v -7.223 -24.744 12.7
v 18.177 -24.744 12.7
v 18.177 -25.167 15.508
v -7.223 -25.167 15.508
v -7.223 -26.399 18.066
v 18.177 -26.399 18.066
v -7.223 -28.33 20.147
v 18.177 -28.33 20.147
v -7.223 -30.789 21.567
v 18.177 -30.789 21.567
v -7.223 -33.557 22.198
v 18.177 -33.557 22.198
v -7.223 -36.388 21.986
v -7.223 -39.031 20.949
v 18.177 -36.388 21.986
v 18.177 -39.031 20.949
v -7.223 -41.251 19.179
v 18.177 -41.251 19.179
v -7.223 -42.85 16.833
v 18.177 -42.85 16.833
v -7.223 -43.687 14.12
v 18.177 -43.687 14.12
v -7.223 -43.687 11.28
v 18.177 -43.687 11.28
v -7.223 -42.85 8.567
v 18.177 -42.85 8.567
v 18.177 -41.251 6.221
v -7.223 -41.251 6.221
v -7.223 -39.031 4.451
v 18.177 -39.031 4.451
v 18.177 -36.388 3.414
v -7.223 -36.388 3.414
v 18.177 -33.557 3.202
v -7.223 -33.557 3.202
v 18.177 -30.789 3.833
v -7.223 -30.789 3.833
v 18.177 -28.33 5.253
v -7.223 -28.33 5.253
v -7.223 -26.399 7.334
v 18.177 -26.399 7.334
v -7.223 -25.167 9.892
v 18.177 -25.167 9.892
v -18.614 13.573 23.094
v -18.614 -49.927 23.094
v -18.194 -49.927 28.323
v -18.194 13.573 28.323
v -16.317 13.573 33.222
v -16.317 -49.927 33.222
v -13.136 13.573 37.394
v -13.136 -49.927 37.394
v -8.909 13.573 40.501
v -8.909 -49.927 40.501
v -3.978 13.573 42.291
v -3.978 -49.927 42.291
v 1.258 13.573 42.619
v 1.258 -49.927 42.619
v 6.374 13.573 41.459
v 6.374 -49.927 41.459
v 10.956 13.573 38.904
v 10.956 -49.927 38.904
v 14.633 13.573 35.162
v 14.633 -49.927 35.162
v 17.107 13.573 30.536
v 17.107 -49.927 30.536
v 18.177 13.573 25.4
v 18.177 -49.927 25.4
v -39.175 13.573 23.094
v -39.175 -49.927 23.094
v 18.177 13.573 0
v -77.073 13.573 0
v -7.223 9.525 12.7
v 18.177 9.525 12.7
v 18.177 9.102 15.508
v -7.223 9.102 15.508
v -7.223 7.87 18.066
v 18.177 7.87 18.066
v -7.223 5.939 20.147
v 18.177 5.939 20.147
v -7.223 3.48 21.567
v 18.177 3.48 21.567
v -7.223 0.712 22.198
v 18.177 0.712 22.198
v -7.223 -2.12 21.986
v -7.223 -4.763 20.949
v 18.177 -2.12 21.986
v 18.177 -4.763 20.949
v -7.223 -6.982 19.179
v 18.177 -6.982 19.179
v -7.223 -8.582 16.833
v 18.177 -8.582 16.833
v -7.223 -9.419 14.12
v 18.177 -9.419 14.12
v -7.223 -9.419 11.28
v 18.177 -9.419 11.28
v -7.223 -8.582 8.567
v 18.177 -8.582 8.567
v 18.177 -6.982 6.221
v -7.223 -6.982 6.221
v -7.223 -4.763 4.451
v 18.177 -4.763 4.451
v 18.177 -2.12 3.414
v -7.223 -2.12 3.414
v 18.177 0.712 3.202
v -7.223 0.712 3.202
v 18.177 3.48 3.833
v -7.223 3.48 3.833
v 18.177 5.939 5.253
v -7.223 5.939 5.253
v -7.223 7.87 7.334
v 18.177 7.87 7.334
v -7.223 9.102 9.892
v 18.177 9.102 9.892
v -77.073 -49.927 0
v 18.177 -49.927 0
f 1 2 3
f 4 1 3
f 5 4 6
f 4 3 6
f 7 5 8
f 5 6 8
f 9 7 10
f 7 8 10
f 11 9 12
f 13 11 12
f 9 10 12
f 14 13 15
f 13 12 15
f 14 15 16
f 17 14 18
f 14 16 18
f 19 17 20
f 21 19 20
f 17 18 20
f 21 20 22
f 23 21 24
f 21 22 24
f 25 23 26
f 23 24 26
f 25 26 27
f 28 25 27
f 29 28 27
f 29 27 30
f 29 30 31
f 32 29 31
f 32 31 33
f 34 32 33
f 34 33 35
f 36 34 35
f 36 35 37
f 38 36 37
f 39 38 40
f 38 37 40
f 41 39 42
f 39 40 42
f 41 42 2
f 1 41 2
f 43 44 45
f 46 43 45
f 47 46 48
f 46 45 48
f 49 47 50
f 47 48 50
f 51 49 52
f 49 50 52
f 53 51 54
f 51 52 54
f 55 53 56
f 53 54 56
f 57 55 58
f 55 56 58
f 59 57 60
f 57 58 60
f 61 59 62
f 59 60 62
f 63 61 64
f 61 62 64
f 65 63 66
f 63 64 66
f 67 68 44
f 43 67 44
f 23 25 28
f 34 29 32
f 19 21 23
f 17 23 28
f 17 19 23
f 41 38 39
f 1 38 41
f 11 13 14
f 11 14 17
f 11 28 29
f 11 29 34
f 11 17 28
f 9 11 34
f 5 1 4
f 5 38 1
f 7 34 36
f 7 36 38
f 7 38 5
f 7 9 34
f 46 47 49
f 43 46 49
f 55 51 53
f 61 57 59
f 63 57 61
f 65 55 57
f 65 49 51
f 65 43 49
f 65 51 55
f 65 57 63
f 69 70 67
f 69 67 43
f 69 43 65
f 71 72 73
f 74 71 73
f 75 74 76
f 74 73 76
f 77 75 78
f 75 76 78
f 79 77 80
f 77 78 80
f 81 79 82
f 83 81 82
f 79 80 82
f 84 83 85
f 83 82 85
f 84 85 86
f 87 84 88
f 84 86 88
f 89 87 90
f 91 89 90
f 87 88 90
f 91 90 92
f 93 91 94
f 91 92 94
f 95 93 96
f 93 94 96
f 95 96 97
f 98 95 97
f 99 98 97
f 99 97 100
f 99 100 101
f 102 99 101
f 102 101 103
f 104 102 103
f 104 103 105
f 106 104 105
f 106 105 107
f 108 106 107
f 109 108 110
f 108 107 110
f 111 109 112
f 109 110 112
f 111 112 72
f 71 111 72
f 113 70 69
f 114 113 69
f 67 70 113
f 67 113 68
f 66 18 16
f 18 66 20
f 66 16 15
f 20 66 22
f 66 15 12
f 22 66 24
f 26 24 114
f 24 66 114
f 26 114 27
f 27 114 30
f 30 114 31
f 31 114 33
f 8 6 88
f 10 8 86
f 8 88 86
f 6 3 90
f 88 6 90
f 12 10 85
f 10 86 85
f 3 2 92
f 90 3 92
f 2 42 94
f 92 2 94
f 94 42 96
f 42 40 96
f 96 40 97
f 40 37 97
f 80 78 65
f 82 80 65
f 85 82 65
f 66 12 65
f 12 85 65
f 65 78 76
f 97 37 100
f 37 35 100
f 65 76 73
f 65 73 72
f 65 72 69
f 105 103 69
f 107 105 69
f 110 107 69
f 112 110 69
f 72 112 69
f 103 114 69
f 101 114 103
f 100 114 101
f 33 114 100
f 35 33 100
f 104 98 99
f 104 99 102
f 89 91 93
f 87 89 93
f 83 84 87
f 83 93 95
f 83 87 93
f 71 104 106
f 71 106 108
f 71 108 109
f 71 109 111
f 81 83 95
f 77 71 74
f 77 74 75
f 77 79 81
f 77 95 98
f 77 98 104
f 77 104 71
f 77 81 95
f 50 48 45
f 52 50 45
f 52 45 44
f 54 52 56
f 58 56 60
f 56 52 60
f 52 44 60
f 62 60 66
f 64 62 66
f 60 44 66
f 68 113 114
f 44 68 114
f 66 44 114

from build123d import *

# Parameters (mm, degrees)
F0_W     = 95.25
F0_H     = 63.5
F1_DEPTH = 50.8
F3_DEPTH = 63.501
F5_DEPTH = 25.4
F6_R     = 9.525
F7_DEPTH = 25.4


with BuildPart() as f1:
    # F0 (on Top) → F1 (new body)
    with BuildSketch(Plane.XY):
        with Locations((-29.448411174, -18.1773232762)):
            Rectangle(F0_W, F0_H)
    extrude(amount=F1_DEPTH)

    # F2 (on face) → F3 (cut, through all)
    with BuildSketch(Plane.XZ.offset(49.9273232762)):
        with BuildLine():
            Line((-77.073411174, 50.8), (-77.073411174, 0))
            Line((-77.073411174, 0), (-39.1752533615, 23.0941344053))
            Line((-39.1752533615, 23.0941344053), (-18.6140239239, 23.0941344053))
            ThreePointArc((-18.6140239239, 23.0941344053), (-1.3716503463, 42.6423735776), (18.176588826, 25.4))
            Line((18.176588826, 25.4), (18.176588826, 50.8))
            Line((18.176588826, 50.8), (-77.073411174, 50.8))
        make_face()
    extrude(amount=-F3_DEPTH, mode=Mode.SUBTRACT)

    # F4 (on face) → F5 (cut)
    with BuildSketch(Plane.YZ.offset(18.176588826)):
        with BuildLine():
            ThreePointArc((-24.7437144876, 12.7), (-34.2687144876, 22.225), (-43.7937144876, 12.7))
            Line((-43.7937144876, 12.7), (-24.7437144876, 12.7))
        make_face()
        with BuildLine():
            Line((-24.7437144876, 12.7), (-43.7937144876, 12.7))
            ThreePointArc((-43.7937144876, 12.7), (-34.2687144876, 3.175), (-24.7437144876, 12.7))
        make_face()
        with BuildLine():
            ThreePointArc((-43.7937144876, 12.7), (-34.2687144876, 3.175), (-24.7437144876, 12.7))
            Line((-24.7437144876, 12.7), (-43.7937144876, 12.7))
        make_face()
    extrude(amount=-F5_DEPTH, mode=Mode.SUBTRACT)

    # F6 (on face) → F7 (cut)
    with BuildSketch(Plane.YZ.offset(18.176588826)):
        with Locations((0, 12.7)):
            Circle(F6_R)
    extrude(amount=-F7_DEPTH, mode=Mode.SUBTRACT)


solid = f1.part
